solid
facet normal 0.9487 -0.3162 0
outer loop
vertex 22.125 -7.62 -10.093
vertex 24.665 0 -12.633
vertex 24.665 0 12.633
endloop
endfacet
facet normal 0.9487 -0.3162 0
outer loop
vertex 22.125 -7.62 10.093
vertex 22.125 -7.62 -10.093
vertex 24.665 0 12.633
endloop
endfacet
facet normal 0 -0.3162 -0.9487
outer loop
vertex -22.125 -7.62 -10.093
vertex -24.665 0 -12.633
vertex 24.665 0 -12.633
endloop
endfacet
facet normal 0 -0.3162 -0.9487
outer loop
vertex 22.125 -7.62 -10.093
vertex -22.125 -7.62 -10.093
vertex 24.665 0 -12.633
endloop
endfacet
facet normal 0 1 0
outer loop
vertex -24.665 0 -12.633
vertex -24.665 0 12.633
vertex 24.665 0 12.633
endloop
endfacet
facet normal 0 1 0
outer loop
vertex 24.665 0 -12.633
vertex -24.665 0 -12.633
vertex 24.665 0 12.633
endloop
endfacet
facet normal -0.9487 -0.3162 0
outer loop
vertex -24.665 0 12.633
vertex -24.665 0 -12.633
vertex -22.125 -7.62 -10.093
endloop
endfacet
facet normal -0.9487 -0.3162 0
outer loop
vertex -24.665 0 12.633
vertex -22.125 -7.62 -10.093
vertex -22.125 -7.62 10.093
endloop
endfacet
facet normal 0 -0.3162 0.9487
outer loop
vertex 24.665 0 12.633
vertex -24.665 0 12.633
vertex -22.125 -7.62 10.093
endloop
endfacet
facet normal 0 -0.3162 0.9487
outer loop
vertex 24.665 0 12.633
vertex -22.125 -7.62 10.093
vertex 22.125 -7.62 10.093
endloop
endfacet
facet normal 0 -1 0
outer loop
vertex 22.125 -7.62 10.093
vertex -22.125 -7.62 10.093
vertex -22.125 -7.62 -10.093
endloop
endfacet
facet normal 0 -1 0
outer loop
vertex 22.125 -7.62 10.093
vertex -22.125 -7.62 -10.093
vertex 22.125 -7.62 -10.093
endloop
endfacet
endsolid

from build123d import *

# Parameters (mm, degrees)
F0_W     = 49.3294708431
F0_H     = 25.266315788
F1_DEPTH = 7.62
F2_SIZE2 = 7.61999
F2_SIZE  = 2.53999


# Not quite as in the source:
# - a fillet or chamfer is up to 0.001 mm smaller than in the source, because OpenCascade refuses the exact size


with BuildPart() as f1:
    # F0 (on Front) → F1 (new body)
    with BuildSketch(Plane.XZ):
        Rectangle(F0_W, F0_H)
    extrude(amount=F1_DEPTH)

    # F2 (size 2.54 and 7.62 in the source; OpenCascade refuses exactly that, so slightly less here)
    f2_edges = [f1.edges().sort_by_distance(p)[0] for p in [
        (0, -7.62, 12.633158),
        (24.664735, -7.62, 0),
        (-24.664735, -7.62, 0),
        (0, -7.62, -12.633158),
    ]]
    f2_side = f1.faces().sort_by_distance((0, -7.62, 0))[0]
    chamfer(f2_edges, length=F2_SIZE, length2=F2_SIZE2, reference=f2_side)


solid = f1.part
